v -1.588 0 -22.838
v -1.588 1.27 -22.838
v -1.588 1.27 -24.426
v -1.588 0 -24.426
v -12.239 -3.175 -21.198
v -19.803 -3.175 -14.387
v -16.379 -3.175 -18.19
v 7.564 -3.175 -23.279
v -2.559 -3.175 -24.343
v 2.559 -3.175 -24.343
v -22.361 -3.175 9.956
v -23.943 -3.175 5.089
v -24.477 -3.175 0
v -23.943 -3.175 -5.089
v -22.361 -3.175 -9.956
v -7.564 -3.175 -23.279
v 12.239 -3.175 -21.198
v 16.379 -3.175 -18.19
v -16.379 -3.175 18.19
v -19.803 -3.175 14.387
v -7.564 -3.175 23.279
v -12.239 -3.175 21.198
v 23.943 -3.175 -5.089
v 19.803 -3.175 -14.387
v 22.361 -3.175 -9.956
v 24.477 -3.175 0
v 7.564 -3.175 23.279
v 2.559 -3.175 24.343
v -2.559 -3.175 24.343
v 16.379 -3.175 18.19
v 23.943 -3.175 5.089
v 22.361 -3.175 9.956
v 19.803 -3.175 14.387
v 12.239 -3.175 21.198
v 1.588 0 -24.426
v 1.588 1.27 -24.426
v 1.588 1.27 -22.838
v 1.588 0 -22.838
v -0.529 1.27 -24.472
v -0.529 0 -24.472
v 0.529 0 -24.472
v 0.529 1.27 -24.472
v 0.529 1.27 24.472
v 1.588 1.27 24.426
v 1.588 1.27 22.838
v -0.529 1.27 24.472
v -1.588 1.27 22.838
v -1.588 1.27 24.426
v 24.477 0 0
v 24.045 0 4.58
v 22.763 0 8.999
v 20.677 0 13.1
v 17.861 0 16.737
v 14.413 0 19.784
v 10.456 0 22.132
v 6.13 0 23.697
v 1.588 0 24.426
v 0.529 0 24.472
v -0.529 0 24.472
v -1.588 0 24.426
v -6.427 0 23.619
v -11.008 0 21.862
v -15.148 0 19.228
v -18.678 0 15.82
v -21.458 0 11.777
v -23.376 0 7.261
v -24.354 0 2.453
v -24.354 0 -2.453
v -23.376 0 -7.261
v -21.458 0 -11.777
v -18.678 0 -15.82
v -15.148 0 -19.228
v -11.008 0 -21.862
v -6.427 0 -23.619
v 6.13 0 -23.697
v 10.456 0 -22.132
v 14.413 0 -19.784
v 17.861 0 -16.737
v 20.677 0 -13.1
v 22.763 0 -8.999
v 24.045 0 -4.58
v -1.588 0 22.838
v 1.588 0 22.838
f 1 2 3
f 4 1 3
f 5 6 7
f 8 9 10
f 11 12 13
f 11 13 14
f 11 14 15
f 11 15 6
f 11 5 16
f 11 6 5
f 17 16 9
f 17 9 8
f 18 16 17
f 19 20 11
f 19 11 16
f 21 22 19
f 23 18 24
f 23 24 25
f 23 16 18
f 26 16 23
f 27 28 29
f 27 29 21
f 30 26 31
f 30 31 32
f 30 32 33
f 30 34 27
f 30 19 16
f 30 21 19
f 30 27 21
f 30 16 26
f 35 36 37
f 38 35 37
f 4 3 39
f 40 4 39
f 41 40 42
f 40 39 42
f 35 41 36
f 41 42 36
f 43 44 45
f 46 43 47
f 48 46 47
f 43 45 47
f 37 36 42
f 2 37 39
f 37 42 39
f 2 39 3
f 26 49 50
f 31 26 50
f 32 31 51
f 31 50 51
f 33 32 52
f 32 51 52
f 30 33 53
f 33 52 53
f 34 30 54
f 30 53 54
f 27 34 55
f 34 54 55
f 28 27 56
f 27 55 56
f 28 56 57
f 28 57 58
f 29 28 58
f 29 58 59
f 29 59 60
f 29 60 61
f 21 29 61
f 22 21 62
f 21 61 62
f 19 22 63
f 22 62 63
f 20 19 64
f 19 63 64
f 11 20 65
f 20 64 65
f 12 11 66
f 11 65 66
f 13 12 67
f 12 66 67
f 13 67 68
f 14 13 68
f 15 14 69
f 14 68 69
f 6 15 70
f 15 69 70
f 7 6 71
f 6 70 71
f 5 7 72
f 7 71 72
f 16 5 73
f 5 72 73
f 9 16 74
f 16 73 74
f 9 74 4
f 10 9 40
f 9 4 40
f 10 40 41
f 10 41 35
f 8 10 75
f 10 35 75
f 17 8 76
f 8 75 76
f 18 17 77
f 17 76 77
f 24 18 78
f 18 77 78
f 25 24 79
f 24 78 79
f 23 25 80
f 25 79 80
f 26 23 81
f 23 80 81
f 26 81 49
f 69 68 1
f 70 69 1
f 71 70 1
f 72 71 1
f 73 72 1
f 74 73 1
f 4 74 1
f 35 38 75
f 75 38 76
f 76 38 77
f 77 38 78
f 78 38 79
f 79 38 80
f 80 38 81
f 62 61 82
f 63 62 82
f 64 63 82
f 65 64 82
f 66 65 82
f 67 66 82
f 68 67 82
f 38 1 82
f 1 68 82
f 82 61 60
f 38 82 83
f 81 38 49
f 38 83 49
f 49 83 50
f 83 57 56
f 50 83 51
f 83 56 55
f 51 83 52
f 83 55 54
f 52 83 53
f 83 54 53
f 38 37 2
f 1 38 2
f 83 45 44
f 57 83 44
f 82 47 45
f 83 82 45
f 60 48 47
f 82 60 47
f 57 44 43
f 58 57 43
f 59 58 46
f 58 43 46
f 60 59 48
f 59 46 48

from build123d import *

# Parameters (mm, degrees)
SKETCH1_R           = 24.477436685
BOSS_EXTRUDE1_DEPTH = 3.175
BOSS_EXTRUDE2_START = 1.27
BOSS_EXTRUDE2_DEPTH = 1.27


with BuildPart() as part:
    # Sketch1 → Boss-Extrude1 (new body)
    with BuildSketch(Plane.XZ):
        Circle(SKETCH1_R)
    extrude(amount=BOSS_EXTRUDE1_DEPTH)

    # Sketch2 → Boss-Extrude2 (add)
    with BuildSketch(Plane(origin=(0, 0, 0), x_dir=(1, 0, 0), z_dir=(0, 1, 0)).offset(BOSS_EXTRUDE2_START)):
        with BuildLine():
            Line((1.5875, 24.425903267), (1.5875, 22.838403267))
            Line((1.5875, 22.838403267), (-1.5875, 22.838403267))
            Line((-1.5875, 22.838403267), (-1.5875, 24.425903267))
            ThreePointArc((-1.5875, 24.425903267), (0, 24.477436685), (1.5875, 24.425903267))
        make_face()
        with BuildLine():
            Line((-1.5875, -24.425903267), (-1.5875, -22.838403267))
            Line((-1.5875, -22.838403267), (1.5875, -22.838403267))
            Line((1.5875, -22.838403267), (1.5875, -24.425903267))
            ThreePointArc((1.5875, -24.425903267), (0, -24.477436685), (-1.5875, -24.425903267))
        make_face()
    extrude(amount=-BOSS_EXTRUDE2_DEPTH)


solid = part.part
